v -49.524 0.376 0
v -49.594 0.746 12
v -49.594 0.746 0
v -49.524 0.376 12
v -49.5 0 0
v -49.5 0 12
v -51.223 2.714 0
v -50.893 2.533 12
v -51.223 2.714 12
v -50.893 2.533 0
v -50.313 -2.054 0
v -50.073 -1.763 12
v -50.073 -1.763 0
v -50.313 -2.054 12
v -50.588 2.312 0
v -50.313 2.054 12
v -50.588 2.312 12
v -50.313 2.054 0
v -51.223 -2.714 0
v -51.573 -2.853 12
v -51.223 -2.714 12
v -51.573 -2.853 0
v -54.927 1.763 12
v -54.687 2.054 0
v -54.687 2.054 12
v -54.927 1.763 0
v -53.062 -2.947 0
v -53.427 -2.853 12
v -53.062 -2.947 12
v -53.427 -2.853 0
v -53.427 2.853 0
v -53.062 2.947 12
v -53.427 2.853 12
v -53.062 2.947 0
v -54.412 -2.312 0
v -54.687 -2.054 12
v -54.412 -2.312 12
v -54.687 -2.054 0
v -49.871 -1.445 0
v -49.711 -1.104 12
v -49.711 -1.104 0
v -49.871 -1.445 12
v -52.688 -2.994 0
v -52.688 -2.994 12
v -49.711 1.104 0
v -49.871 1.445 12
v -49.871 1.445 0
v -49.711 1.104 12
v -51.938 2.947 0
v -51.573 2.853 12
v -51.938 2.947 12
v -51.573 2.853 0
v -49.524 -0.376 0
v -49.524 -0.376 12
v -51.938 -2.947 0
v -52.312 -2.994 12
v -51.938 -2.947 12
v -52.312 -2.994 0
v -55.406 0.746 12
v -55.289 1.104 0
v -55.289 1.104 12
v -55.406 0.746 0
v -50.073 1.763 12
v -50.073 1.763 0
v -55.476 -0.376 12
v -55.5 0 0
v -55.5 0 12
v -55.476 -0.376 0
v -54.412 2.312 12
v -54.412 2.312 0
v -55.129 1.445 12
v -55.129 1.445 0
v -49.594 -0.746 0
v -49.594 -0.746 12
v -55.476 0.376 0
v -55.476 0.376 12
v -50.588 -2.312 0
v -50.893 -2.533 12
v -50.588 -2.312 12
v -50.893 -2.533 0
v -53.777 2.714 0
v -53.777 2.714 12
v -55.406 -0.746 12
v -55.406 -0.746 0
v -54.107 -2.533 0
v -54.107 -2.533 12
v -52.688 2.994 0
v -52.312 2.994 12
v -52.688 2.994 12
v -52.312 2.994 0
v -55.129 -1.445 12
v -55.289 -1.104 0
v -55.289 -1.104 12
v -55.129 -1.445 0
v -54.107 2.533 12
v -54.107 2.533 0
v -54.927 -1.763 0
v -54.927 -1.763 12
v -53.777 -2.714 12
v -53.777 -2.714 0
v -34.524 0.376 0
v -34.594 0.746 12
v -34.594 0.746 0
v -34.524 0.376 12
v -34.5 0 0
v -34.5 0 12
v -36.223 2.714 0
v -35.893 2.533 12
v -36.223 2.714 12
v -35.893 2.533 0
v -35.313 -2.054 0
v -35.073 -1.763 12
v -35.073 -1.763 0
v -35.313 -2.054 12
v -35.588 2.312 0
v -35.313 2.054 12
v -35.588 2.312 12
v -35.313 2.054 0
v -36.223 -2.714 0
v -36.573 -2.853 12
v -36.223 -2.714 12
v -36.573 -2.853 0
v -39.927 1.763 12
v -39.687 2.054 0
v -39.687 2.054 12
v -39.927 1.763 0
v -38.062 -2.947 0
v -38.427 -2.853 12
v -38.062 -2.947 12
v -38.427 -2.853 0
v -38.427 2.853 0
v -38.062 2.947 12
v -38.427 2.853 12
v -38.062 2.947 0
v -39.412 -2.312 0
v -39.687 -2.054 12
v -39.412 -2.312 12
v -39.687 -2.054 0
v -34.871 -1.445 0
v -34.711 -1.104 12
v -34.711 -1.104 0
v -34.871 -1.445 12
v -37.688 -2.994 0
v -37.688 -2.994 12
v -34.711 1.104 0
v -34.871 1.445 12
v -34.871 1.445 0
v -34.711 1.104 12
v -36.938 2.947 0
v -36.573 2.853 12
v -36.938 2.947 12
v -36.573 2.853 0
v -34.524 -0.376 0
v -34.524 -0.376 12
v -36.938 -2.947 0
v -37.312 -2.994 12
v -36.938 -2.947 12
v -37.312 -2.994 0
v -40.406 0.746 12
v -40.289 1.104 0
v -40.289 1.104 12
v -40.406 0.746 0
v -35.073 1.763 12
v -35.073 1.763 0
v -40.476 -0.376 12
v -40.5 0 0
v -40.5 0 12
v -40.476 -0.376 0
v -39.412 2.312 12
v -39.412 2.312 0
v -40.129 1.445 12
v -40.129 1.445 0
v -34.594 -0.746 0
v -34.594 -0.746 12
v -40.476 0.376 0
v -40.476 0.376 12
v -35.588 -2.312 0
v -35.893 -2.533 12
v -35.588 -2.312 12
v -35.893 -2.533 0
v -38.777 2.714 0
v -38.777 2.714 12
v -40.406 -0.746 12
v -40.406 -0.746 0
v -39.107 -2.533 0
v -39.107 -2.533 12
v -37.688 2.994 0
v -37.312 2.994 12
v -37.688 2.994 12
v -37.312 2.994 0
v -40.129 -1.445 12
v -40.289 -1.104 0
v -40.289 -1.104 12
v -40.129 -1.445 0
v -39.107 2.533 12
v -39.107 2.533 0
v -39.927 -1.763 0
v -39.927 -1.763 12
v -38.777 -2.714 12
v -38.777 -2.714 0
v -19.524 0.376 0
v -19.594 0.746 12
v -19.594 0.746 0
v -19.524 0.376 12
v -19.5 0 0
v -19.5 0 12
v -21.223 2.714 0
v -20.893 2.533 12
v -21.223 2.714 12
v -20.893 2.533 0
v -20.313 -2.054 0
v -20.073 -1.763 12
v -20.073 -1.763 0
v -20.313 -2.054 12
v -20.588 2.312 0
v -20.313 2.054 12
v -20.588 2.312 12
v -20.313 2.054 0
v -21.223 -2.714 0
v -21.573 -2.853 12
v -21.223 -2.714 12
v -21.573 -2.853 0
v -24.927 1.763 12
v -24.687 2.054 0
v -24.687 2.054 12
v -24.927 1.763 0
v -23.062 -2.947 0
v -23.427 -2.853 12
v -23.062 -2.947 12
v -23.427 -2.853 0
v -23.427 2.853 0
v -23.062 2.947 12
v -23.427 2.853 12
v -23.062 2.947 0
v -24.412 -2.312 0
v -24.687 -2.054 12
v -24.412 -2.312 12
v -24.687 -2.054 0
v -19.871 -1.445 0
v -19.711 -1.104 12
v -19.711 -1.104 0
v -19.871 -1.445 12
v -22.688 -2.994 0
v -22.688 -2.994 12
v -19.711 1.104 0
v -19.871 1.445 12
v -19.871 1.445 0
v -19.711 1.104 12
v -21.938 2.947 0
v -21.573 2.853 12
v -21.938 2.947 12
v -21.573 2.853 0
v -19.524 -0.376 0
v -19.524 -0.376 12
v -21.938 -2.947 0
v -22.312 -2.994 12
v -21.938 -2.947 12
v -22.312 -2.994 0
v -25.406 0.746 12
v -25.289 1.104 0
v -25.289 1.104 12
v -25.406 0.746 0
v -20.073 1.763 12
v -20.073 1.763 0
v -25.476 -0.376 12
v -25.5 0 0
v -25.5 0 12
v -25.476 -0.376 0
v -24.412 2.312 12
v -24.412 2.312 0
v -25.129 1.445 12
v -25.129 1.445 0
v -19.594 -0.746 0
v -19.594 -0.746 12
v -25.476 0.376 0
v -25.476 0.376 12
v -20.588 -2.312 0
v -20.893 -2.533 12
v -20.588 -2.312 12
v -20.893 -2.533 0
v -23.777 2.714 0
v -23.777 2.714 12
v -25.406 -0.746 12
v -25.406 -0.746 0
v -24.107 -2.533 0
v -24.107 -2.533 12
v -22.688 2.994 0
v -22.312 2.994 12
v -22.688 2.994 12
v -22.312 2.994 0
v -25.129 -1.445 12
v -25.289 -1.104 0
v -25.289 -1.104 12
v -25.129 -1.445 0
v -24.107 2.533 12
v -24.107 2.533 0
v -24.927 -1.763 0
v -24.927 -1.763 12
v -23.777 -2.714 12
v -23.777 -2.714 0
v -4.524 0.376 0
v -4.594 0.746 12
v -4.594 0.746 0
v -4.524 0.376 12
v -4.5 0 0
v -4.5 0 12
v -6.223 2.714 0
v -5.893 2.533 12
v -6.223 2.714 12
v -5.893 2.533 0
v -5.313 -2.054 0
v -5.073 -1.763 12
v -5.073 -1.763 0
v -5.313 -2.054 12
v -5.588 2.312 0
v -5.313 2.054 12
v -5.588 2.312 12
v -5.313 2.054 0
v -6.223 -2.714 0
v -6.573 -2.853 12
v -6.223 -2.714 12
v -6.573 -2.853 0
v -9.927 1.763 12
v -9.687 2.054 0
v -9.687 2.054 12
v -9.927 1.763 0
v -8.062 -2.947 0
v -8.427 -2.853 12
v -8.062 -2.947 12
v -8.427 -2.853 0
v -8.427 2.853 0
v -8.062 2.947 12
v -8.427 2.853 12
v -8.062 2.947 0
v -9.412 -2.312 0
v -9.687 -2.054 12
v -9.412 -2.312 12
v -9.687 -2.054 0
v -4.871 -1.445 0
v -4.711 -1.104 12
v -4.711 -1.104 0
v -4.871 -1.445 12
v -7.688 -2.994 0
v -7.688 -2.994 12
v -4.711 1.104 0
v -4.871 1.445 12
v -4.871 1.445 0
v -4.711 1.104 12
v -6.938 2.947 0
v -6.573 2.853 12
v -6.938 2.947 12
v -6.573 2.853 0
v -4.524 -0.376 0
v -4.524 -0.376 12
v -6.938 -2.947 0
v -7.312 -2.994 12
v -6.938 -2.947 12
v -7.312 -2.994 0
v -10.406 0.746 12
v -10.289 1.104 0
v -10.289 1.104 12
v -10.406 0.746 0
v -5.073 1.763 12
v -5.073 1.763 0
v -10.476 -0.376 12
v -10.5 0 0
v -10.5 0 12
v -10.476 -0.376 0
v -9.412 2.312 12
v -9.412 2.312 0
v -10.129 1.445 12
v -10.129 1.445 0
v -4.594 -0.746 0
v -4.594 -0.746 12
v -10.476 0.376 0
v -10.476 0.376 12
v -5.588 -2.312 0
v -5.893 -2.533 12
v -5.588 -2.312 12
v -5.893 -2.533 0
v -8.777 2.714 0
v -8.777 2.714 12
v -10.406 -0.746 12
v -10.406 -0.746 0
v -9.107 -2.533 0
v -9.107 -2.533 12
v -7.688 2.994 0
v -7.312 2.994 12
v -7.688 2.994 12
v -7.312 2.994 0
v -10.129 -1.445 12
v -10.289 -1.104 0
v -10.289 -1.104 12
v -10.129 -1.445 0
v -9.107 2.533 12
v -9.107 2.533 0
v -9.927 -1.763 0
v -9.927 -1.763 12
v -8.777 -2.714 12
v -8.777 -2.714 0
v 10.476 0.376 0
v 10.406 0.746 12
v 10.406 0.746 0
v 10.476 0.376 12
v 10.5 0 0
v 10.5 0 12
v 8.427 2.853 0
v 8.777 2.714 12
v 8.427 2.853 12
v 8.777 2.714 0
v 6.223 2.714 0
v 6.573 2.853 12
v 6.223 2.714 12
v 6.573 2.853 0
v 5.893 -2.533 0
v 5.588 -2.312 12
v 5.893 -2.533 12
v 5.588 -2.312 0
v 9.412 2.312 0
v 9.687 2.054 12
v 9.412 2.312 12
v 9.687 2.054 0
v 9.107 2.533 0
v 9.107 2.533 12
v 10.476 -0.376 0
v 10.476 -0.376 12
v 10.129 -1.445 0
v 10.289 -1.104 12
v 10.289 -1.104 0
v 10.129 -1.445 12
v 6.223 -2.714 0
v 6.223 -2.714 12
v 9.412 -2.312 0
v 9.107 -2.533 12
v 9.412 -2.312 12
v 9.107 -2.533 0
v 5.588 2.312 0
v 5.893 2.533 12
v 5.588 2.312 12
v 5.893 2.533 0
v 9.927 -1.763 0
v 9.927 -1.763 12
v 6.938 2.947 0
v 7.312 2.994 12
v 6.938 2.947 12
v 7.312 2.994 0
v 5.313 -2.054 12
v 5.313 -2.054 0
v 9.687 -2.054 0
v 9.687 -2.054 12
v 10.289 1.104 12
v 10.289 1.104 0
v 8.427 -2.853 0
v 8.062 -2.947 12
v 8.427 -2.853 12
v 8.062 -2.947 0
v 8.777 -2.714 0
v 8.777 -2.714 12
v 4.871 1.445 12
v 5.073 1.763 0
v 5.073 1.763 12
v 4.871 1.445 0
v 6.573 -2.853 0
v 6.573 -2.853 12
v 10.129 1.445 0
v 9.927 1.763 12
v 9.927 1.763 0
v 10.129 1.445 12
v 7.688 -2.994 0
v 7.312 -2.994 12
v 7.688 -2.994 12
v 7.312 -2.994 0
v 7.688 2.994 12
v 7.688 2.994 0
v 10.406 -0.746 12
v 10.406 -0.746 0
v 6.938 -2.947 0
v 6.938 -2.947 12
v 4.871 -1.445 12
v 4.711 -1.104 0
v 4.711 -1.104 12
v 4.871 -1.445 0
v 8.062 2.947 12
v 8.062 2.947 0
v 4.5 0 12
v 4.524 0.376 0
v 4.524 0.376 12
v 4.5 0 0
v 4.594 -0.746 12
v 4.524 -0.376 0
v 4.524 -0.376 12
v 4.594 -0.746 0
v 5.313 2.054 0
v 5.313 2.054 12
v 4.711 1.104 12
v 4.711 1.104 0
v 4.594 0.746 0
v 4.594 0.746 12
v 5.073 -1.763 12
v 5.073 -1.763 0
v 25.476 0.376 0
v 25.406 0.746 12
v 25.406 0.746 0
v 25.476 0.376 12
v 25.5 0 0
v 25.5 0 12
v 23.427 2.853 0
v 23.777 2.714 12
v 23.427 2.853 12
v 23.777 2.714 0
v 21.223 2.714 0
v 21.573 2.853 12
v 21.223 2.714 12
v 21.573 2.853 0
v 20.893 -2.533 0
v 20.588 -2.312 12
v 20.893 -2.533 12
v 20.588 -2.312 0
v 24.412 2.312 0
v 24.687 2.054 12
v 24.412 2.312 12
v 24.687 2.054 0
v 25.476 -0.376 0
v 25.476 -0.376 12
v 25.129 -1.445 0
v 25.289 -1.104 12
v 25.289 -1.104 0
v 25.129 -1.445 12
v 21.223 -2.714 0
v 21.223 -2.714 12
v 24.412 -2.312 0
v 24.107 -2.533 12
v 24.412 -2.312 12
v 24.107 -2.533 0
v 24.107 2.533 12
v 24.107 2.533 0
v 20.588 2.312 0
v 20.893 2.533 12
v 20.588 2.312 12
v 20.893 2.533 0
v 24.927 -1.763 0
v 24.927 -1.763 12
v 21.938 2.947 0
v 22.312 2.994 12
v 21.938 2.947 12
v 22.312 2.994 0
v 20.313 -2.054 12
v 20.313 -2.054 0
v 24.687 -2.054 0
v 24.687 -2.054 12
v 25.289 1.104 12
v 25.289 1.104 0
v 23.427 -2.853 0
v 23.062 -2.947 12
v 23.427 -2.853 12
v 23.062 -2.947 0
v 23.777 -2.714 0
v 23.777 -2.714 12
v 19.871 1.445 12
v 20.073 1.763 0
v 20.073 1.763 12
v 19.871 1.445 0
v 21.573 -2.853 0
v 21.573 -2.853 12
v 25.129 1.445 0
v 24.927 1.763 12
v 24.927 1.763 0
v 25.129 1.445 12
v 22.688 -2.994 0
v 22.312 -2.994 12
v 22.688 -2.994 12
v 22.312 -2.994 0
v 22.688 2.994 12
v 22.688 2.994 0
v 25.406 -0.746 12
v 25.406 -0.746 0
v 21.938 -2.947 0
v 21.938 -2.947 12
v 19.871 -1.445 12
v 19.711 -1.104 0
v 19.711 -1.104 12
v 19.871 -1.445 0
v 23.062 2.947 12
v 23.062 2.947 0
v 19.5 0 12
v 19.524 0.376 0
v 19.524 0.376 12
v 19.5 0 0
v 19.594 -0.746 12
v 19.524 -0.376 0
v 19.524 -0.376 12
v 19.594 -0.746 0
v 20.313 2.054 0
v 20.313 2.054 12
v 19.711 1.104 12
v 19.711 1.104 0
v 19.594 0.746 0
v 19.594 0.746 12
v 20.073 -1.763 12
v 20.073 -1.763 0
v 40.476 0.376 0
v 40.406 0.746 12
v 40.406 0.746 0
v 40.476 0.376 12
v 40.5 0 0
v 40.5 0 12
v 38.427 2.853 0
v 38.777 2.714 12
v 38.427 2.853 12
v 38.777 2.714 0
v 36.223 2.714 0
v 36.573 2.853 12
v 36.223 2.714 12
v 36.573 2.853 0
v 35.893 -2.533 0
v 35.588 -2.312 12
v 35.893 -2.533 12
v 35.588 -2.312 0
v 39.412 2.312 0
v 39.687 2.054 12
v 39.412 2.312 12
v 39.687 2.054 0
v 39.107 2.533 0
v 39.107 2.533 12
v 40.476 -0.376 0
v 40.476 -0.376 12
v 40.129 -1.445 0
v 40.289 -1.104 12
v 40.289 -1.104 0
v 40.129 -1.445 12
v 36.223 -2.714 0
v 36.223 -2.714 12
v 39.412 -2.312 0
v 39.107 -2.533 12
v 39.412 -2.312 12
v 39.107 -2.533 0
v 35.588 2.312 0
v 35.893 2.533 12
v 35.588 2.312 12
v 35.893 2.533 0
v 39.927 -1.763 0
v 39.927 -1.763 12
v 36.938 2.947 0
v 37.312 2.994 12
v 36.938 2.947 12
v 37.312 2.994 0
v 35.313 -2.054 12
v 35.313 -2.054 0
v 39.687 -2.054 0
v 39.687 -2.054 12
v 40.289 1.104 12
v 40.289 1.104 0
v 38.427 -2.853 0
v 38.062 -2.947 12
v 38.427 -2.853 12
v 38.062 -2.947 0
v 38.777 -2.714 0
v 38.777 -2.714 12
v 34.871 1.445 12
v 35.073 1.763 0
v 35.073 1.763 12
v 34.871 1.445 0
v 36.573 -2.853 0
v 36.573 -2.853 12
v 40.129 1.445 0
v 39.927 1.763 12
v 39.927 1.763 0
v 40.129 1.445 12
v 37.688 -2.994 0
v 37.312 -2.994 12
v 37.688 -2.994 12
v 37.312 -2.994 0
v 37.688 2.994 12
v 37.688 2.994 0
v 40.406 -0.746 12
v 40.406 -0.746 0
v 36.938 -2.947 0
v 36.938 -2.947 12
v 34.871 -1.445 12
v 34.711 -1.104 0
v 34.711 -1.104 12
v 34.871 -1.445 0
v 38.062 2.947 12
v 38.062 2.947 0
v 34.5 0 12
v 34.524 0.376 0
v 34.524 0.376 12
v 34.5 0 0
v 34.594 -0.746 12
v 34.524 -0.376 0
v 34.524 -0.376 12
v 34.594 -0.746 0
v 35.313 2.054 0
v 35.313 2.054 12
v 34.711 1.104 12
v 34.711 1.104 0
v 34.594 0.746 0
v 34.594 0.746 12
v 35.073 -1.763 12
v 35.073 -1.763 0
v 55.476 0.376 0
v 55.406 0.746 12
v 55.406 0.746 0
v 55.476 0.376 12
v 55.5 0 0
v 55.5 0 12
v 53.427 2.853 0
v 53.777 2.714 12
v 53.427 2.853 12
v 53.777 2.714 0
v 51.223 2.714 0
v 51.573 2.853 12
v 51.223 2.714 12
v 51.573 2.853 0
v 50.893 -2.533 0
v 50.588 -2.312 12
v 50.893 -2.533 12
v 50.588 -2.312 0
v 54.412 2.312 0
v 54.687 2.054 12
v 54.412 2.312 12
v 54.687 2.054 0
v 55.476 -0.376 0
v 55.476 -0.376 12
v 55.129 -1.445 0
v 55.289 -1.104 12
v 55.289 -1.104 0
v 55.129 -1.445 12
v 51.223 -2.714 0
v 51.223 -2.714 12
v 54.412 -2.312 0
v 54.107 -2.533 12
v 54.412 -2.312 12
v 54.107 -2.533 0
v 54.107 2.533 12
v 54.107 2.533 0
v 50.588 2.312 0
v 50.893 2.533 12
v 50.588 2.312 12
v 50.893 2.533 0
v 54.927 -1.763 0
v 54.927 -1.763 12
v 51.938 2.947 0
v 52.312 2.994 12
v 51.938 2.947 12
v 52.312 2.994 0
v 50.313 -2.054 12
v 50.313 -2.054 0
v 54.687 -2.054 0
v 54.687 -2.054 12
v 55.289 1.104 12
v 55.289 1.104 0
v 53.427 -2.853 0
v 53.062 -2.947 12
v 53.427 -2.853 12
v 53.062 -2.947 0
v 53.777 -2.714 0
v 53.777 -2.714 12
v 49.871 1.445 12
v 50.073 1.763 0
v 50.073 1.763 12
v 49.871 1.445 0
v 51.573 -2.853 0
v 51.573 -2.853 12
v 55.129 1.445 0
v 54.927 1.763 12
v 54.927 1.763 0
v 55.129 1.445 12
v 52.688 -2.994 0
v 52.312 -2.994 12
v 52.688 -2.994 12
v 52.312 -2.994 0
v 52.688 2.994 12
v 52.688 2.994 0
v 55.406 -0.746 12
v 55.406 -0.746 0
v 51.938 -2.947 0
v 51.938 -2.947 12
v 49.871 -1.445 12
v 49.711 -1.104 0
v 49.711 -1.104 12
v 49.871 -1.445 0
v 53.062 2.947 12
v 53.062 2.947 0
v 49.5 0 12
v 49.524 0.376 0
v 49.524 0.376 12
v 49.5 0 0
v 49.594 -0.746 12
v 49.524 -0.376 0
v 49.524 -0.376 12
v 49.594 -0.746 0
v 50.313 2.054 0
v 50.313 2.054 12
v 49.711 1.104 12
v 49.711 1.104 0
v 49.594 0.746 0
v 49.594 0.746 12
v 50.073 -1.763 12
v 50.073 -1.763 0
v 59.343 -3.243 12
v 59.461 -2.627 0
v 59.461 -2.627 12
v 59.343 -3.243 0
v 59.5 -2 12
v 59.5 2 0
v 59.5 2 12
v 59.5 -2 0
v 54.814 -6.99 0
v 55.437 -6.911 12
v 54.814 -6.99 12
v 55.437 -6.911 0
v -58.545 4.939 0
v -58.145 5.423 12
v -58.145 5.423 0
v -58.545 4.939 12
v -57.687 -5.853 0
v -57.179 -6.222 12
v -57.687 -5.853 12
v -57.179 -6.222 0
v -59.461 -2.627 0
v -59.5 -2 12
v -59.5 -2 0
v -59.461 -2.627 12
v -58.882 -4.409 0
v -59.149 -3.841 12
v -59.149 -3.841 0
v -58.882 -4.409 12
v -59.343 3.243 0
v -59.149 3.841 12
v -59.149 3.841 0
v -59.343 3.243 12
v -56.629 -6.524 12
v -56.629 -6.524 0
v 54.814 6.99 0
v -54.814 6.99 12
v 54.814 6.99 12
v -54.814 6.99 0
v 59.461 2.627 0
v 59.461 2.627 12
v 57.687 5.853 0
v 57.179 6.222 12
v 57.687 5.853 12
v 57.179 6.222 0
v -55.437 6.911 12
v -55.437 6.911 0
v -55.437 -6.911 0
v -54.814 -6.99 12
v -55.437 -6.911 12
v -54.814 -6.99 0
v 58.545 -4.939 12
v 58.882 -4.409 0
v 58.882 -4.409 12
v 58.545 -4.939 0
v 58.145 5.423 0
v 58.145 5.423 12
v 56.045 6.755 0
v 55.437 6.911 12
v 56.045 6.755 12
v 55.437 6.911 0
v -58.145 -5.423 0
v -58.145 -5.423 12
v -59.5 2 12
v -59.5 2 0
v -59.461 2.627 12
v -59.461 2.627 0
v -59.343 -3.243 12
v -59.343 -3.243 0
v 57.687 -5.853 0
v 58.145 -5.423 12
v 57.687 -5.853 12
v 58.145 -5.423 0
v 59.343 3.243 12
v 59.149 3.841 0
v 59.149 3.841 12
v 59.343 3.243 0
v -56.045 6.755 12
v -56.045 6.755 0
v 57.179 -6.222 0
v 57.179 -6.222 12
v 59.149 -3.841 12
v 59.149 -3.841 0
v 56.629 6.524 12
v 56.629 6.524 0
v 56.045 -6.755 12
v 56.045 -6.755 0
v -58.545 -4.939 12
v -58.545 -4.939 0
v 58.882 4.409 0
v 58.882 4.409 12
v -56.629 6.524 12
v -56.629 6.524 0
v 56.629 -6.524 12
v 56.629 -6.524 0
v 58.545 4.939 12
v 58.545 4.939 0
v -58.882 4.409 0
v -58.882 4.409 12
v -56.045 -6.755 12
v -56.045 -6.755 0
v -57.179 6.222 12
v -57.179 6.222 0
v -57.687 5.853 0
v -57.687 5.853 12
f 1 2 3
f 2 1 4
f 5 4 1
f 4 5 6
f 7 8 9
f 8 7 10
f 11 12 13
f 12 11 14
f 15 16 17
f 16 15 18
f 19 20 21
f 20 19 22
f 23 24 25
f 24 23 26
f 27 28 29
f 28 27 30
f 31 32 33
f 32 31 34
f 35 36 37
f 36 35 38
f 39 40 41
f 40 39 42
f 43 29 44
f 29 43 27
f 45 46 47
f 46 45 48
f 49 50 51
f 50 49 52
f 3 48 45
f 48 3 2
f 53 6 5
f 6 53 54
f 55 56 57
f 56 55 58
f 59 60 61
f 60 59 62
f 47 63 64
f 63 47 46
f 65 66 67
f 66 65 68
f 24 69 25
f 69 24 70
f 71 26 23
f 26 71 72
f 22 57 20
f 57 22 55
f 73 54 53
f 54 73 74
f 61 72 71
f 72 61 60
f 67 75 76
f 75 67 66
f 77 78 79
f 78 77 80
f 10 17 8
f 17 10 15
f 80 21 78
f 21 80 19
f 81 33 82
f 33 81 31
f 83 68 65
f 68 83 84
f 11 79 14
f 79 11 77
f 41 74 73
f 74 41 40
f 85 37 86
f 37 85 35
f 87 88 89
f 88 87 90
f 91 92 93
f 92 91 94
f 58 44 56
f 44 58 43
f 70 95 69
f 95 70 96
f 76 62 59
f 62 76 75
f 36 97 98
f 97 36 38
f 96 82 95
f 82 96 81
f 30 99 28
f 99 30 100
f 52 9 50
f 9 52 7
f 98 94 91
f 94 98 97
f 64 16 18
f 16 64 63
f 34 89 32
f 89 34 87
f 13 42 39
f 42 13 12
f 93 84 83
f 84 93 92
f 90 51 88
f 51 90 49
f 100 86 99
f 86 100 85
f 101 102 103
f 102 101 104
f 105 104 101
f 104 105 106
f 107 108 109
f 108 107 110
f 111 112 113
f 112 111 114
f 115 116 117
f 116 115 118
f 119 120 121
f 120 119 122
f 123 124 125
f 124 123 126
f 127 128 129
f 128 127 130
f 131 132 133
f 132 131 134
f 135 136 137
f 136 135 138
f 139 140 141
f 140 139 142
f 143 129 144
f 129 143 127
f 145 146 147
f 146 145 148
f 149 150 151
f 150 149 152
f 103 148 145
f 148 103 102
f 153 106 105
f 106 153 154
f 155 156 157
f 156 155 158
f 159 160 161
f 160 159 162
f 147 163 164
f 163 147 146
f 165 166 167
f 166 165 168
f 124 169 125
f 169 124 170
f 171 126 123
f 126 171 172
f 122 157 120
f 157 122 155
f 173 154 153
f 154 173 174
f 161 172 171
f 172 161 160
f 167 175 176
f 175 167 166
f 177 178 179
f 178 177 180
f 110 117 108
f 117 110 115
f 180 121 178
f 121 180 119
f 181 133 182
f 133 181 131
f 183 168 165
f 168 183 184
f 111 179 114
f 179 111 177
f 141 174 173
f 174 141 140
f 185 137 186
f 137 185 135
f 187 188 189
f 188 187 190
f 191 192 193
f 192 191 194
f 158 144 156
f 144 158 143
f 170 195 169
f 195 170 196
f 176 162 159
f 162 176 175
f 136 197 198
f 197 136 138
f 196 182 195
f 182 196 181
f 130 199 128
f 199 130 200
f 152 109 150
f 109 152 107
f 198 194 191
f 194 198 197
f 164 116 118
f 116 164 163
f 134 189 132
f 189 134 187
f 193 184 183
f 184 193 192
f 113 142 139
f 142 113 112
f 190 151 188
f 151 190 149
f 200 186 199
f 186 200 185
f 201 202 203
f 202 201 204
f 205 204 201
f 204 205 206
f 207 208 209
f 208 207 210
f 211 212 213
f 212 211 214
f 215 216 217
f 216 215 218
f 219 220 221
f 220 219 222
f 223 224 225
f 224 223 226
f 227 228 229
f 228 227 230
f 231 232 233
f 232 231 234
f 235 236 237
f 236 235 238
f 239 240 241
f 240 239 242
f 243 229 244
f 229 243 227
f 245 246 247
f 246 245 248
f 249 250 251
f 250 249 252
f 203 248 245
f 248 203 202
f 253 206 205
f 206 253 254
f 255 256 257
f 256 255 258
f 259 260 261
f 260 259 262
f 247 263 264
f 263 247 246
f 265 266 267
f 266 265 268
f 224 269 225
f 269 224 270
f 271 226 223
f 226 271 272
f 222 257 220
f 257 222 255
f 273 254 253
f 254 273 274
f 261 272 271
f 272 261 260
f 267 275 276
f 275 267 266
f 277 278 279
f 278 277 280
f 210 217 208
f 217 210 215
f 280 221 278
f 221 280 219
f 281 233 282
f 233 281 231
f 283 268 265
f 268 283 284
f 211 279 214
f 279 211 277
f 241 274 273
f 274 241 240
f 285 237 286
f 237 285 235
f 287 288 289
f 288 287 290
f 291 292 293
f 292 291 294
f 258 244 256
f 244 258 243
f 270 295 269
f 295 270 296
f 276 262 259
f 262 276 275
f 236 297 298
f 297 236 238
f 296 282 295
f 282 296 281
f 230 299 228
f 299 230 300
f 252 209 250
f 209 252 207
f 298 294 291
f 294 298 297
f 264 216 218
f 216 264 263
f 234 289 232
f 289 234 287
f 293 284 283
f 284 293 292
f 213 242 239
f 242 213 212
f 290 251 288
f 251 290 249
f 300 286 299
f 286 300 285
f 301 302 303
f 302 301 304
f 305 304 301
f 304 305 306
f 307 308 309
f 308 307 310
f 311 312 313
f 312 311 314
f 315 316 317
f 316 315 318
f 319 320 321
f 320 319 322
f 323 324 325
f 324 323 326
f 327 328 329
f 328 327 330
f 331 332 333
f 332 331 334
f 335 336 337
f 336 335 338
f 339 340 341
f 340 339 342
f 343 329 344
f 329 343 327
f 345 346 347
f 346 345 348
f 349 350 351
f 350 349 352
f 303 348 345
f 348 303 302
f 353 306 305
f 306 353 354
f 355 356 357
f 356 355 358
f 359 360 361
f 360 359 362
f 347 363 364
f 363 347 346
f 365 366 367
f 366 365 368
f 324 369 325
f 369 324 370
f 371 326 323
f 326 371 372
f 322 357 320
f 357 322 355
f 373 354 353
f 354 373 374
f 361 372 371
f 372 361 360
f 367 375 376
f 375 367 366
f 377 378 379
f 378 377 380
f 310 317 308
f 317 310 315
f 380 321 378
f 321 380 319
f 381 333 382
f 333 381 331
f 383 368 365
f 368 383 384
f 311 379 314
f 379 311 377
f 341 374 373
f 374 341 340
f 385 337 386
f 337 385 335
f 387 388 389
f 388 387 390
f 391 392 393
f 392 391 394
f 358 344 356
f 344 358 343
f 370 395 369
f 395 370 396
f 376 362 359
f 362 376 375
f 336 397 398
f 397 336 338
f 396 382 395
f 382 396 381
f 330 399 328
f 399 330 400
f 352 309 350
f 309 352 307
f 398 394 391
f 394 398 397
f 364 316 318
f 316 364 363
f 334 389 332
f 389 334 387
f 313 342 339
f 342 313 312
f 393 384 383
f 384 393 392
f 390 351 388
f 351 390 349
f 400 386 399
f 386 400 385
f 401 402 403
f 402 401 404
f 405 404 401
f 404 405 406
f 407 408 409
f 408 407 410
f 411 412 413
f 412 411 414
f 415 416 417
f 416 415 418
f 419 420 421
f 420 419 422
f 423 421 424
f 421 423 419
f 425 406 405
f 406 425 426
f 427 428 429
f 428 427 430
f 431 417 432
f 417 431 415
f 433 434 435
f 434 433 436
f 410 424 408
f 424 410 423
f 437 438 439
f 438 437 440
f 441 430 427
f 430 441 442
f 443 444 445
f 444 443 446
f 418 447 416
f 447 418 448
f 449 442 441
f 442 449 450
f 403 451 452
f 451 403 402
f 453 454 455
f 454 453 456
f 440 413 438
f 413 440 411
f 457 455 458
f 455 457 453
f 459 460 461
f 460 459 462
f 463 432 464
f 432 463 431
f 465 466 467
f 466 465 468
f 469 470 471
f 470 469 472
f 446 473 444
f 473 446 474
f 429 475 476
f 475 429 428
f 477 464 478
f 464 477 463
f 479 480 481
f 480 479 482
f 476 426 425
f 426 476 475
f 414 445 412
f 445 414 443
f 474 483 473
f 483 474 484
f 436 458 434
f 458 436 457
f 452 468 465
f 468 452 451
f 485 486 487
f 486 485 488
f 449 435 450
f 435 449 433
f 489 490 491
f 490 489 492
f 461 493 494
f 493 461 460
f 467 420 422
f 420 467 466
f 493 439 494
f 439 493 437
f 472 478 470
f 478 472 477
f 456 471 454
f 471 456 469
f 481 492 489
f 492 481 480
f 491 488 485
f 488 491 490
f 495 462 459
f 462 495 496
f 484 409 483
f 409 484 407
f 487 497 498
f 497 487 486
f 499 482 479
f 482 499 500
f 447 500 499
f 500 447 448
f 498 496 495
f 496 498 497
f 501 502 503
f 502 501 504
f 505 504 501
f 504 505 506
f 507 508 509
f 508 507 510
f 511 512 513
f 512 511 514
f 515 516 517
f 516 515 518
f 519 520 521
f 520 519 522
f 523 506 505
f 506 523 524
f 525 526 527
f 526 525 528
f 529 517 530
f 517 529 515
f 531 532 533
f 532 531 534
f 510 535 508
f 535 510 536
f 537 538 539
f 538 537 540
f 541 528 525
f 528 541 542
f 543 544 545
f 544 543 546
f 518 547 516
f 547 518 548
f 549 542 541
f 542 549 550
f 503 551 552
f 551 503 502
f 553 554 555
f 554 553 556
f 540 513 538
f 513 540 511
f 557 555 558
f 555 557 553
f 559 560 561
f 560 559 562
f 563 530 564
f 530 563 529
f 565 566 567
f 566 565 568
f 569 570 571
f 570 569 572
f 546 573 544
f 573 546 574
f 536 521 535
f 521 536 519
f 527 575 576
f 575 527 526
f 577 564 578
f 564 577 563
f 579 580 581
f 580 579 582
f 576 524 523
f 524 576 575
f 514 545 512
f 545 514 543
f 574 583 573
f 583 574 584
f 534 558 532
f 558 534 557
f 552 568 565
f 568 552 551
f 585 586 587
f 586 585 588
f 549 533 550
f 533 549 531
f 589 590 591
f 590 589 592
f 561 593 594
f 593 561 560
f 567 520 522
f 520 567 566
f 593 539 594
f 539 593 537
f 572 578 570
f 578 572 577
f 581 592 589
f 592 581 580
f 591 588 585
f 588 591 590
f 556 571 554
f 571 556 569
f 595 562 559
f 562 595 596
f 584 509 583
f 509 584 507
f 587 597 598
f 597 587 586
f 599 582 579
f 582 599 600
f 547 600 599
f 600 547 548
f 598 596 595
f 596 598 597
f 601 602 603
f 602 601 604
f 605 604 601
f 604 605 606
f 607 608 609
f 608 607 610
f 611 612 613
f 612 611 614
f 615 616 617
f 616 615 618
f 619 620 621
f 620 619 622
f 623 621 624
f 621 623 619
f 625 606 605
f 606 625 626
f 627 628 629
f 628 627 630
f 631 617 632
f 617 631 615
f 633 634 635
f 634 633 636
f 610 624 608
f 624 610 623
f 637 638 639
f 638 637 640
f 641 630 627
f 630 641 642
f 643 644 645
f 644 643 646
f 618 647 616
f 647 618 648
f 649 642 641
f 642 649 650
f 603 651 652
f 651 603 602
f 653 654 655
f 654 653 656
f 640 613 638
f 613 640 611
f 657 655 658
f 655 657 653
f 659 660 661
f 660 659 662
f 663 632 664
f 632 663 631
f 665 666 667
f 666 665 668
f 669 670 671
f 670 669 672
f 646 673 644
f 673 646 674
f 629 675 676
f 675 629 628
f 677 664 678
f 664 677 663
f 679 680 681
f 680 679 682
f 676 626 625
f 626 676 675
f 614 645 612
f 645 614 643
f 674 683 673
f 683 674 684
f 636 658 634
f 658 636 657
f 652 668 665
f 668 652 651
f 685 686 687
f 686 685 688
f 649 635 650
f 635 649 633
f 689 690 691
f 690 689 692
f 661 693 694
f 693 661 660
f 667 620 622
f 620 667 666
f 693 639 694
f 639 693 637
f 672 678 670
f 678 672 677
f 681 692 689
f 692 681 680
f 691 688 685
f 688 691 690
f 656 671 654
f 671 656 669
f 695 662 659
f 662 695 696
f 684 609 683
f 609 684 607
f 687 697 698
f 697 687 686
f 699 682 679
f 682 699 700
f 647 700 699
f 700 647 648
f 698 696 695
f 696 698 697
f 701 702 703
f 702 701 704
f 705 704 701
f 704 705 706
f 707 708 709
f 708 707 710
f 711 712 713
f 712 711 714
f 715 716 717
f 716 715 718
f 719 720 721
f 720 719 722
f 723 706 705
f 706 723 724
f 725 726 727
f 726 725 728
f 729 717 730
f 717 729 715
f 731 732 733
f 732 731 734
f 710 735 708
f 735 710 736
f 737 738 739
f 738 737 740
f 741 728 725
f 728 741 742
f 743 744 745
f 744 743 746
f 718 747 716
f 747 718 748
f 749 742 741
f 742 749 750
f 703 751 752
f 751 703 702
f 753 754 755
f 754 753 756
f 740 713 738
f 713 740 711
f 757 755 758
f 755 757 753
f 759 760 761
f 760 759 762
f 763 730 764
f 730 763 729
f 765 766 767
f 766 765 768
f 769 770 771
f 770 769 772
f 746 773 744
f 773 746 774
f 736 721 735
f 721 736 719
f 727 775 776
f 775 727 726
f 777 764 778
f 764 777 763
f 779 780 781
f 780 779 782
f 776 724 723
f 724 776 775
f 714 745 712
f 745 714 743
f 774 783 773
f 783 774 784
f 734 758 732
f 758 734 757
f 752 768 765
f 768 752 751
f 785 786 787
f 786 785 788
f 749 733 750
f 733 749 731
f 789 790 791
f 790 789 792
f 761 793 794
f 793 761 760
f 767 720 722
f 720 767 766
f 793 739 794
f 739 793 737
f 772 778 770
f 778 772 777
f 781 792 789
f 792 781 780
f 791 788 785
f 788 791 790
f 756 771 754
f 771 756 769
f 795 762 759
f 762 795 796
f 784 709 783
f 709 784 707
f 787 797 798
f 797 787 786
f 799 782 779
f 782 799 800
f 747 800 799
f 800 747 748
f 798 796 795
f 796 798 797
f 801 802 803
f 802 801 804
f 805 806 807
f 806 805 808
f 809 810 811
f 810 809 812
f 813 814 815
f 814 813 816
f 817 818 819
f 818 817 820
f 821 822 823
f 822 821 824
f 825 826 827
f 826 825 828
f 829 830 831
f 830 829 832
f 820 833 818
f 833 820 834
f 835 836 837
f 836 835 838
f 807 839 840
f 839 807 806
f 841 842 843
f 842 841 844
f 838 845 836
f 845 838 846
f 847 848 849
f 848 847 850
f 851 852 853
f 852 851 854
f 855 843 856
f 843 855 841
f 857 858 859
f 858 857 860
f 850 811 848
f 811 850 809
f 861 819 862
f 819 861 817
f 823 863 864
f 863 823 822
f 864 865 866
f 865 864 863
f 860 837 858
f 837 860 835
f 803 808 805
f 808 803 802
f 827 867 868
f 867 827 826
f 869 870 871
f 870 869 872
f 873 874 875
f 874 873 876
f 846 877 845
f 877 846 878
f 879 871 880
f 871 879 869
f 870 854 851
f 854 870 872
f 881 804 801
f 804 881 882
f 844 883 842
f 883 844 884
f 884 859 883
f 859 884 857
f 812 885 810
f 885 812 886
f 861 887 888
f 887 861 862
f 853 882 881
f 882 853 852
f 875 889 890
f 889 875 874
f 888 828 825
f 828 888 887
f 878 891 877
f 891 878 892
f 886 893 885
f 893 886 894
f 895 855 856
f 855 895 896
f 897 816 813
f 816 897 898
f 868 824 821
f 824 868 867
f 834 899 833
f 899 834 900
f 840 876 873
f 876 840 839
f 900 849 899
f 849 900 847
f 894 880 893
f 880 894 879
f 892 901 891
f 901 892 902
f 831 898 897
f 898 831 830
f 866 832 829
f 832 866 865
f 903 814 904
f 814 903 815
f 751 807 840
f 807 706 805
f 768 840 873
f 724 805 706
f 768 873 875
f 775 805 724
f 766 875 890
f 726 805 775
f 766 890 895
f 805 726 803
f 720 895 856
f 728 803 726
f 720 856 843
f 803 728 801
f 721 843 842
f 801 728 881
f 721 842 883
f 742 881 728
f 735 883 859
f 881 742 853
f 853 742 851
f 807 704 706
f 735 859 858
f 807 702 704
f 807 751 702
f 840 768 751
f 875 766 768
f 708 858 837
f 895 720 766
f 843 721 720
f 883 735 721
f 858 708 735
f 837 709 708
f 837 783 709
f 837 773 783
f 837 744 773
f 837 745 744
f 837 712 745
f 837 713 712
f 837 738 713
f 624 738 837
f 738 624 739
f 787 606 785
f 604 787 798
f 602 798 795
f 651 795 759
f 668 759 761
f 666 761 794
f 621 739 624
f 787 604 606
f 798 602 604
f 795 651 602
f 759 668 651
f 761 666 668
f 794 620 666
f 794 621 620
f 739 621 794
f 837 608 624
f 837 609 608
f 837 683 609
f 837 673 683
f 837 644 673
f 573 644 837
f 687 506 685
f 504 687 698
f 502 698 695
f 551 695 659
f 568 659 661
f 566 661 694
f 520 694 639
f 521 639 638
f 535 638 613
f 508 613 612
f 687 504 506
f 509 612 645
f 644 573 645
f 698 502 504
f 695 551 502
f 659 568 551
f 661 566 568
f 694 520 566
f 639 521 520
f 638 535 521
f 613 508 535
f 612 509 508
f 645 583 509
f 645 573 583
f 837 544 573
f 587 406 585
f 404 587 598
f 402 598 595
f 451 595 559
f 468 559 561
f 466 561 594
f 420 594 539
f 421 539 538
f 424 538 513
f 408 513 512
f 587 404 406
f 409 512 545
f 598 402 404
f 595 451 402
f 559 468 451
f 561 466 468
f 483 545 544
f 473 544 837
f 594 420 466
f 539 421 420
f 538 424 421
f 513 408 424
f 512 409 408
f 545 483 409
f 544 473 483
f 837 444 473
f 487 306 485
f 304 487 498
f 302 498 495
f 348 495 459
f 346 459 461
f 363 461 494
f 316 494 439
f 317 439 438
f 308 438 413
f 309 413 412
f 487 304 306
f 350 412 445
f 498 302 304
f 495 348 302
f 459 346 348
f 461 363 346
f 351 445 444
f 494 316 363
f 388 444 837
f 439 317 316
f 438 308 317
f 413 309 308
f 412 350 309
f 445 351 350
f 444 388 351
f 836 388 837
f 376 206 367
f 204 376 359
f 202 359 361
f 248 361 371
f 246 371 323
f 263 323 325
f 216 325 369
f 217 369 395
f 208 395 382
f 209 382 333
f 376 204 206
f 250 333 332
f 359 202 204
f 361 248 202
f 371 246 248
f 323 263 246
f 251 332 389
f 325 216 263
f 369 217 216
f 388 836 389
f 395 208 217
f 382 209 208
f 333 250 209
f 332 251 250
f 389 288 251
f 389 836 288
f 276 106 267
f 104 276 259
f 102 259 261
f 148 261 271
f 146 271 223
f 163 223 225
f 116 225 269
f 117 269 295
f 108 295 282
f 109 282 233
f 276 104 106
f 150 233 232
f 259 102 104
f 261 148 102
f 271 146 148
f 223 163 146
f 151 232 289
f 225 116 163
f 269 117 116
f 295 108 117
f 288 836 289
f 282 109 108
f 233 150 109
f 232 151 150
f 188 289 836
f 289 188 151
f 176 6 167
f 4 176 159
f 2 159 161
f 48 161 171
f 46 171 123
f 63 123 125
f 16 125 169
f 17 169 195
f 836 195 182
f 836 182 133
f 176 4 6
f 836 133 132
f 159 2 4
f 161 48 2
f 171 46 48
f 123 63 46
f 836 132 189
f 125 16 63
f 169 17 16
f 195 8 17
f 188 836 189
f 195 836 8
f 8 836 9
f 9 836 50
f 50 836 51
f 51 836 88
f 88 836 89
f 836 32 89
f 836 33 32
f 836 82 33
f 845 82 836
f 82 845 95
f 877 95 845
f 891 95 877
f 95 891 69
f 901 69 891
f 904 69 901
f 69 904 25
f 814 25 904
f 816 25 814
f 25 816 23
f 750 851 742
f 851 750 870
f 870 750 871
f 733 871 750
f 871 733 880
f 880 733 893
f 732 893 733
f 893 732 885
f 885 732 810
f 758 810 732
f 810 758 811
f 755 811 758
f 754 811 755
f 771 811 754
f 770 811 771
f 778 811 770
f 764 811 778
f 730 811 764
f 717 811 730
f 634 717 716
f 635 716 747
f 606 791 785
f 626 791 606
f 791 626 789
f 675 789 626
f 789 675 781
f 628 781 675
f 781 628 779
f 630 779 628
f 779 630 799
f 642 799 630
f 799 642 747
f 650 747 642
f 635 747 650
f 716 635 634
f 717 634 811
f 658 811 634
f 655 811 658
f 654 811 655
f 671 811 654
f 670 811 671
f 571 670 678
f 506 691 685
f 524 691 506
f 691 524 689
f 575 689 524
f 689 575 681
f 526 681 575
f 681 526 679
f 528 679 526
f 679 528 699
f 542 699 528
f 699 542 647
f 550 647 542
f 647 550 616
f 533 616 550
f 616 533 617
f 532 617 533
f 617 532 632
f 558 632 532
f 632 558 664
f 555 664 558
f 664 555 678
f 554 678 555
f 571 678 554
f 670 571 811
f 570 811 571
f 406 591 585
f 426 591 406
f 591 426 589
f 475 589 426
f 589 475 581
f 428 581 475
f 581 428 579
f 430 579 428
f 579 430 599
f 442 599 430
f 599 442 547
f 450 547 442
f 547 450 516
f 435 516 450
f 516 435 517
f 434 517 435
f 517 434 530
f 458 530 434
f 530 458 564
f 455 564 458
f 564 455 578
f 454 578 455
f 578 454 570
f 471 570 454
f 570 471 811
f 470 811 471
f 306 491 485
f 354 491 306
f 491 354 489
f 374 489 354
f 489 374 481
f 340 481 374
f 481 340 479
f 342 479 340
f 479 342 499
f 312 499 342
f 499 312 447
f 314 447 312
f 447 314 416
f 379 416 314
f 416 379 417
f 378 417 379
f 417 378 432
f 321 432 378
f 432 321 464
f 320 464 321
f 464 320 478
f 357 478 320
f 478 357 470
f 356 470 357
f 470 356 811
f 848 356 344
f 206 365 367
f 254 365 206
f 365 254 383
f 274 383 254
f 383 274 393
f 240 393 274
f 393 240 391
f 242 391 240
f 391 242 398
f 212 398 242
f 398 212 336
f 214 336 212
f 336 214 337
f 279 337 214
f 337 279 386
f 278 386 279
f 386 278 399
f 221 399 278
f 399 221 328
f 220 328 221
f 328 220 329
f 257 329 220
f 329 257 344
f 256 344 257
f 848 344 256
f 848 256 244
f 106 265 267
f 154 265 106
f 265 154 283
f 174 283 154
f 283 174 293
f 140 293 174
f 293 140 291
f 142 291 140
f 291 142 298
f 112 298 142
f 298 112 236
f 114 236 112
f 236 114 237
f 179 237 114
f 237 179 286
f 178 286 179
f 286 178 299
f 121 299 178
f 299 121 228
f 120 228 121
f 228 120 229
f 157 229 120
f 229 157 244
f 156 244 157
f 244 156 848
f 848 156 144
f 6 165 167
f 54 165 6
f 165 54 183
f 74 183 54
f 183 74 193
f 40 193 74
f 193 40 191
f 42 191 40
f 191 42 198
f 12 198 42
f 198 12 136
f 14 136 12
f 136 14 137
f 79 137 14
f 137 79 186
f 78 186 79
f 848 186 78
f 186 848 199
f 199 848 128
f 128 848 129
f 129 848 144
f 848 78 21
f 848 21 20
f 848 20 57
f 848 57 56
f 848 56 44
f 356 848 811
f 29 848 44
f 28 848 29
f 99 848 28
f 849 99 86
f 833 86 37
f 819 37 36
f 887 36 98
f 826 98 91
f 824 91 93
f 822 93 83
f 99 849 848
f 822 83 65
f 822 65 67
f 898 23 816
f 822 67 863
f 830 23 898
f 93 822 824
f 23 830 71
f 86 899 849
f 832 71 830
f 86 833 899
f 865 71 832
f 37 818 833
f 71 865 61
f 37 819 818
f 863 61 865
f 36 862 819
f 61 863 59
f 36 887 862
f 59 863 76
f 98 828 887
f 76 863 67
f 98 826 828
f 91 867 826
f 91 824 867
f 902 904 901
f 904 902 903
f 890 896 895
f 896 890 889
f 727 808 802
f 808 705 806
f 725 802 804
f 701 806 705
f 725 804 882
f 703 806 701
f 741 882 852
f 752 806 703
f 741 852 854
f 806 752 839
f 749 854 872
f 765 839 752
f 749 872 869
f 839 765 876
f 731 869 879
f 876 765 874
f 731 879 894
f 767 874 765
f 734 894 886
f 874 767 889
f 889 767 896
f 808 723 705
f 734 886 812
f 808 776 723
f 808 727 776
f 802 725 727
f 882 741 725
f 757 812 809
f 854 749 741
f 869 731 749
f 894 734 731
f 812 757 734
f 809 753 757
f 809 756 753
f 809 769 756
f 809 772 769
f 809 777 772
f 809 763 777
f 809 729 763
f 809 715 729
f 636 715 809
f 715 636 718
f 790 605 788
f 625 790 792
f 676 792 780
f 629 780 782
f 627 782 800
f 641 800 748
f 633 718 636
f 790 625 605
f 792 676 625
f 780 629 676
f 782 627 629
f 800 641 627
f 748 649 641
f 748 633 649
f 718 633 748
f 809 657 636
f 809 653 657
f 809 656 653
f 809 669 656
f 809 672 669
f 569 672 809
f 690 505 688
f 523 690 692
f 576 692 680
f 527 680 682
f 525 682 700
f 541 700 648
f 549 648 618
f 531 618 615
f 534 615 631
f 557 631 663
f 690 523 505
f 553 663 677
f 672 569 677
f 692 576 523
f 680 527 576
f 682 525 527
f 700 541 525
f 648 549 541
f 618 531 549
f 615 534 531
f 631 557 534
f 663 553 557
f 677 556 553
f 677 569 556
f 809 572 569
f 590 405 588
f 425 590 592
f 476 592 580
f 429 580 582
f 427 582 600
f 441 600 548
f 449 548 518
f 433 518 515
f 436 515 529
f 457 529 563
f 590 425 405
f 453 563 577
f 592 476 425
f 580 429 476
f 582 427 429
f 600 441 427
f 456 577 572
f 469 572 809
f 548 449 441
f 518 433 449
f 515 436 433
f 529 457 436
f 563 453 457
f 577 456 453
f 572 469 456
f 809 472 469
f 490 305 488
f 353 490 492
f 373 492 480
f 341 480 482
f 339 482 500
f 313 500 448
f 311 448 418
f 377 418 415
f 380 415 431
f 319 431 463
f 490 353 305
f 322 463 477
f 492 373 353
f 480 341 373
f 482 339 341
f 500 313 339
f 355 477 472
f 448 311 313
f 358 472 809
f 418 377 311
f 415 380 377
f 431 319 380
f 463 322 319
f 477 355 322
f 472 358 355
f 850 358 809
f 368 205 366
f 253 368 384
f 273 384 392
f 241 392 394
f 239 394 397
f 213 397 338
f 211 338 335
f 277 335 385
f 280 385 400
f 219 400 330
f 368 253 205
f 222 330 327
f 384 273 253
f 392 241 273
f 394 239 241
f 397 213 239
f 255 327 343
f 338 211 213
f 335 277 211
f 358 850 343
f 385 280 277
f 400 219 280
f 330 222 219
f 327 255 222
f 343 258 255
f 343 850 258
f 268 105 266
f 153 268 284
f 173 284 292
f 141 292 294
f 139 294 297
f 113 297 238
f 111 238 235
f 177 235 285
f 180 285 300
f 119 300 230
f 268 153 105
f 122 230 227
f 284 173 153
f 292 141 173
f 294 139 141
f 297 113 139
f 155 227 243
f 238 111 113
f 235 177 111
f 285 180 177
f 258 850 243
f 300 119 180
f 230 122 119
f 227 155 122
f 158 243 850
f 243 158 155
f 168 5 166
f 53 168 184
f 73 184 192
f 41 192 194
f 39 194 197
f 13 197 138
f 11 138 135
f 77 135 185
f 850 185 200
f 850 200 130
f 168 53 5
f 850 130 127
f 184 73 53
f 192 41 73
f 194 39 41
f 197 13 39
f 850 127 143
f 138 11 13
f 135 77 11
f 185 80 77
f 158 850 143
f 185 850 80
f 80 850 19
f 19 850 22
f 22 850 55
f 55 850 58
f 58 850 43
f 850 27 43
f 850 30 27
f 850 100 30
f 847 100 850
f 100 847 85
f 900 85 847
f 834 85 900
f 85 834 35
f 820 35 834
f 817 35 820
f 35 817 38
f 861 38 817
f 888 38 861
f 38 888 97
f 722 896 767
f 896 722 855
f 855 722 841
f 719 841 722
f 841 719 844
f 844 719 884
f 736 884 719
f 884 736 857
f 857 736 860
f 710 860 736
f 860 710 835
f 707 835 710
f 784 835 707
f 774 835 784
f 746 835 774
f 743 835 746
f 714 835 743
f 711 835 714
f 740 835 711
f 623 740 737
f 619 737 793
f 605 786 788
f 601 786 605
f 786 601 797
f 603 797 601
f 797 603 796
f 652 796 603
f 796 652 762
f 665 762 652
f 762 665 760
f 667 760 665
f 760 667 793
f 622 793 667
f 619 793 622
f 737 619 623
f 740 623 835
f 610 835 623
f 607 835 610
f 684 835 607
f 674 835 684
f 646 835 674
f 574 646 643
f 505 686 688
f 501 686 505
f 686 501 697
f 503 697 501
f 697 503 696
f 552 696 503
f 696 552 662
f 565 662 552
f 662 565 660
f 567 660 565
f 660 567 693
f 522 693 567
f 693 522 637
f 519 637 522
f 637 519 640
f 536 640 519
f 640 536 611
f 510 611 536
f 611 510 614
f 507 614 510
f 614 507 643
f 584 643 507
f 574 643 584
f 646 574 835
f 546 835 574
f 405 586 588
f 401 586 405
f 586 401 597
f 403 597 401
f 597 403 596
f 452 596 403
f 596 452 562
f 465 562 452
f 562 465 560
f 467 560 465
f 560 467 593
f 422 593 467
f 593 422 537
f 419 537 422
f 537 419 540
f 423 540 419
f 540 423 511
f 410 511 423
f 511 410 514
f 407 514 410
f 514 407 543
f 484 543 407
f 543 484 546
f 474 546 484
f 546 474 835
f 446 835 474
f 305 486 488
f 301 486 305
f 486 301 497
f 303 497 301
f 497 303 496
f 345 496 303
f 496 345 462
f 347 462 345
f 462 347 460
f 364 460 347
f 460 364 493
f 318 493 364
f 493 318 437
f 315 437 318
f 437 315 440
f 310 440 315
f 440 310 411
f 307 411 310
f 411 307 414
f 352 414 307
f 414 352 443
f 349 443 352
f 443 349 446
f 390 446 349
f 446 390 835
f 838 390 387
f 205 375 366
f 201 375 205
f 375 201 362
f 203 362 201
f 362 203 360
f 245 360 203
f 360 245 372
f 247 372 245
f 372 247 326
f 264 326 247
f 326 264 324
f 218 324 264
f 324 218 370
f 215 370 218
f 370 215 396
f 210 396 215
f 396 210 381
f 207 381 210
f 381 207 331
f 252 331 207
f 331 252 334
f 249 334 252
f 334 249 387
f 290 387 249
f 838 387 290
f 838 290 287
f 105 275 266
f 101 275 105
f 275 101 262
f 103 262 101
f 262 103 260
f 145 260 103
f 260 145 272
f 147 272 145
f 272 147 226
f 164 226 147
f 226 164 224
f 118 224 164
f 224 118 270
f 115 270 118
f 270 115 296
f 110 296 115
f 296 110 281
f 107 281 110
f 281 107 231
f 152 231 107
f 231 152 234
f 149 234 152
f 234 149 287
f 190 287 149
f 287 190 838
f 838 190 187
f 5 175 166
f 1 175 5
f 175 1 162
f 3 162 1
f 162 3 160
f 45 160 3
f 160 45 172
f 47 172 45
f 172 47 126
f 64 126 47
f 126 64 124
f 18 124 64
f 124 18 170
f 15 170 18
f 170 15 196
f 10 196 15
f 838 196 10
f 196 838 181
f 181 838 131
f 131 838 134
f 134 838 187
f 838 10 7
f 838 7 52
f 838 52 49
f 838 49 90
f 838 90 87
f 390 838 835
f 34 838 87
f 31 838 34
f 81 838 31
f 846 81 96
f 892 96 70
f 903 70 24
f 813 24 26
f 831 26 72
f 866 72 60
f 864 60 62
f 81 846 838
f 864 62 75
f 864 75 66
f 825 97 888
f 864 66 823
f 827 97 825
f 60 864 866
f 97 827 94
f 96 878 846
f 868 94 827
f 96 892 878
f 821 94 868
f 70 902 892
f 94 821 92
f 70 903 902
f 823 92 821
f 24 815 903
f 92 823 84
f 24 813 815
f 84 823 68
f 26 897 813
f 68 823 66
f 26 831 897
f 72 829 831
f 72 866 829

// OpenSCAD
$fn = 50;


difference() {
	union() {
		hull() {
			translate(v = [-54.5000000000, 2.0000000000, 0]) {
				cylinder(h = 12, r = 5);
			}
			translate(v = [54.5000000000, 2.0000000000, 0]) {
				cylinder(h = 12, r = 5);
			}
			translate(v = [-54.5000000000, -2.0000000000, 0]) {
				cylinder(h = 12, r = 5);
			}
			translate(v = [54.5000000000, -2.0000000000, 0]) {
				cylinder(h = 12, r = 5);
			}
		}
	}
	union() {
		translate(v = [-52.5000000000, 0.0000000000, 0]) {
			translate(v = [0, 0, -100]) {
				cylinder(h = 200, r = 3.0000000000);
			}
		}
		translate(v = [-37.5000000000, 0.0000000000, 0]) {
			translate(v = [0, 0, -100]) {
				cylinder(h = 200, r = 3.0000000000);
			}
		}
		translate(v = [-22.5000000000, 0.0000000000, 0]) {
			translate(v = [0, 0, -100]) {
				cylinder(h = 200, r = 3.0000000000);
			}
		}
		translate(v = [-7.5000000000, 0.0000000000, 0]) {
			translate(v = [0, 0, -100]) {
				cylinder(h = 200, r = 3.0000000000);
			}
		}
		translate(v = [7.5000000000, 0.0000000000, 0]) {
			translate(v = [0, 0, -100]) {
				cylinder(h = 200, r = 3.0000000000);
			}
		}
		translate(v = [22.5000000000, 0.0000000000, 0]) {
			translate(v = [0, 0, -100]) {
				cylinder(h = 200, r = 3.0000000000);
			}
		}
		translate(v = [37.5000000000, 0.0000000000, 0]) {
			translate(v = [0, 0, -100]) {
				cylinder(h = 200, r = 3.0000000000);
			}
		}
		translate(v = [52.5000000000, 0.0000000000, 0]) {
			translate(v = [0, 0, -100]) {
				cylinder(h = 200, r = 3.0000000000);
			}
		}
	}
}
